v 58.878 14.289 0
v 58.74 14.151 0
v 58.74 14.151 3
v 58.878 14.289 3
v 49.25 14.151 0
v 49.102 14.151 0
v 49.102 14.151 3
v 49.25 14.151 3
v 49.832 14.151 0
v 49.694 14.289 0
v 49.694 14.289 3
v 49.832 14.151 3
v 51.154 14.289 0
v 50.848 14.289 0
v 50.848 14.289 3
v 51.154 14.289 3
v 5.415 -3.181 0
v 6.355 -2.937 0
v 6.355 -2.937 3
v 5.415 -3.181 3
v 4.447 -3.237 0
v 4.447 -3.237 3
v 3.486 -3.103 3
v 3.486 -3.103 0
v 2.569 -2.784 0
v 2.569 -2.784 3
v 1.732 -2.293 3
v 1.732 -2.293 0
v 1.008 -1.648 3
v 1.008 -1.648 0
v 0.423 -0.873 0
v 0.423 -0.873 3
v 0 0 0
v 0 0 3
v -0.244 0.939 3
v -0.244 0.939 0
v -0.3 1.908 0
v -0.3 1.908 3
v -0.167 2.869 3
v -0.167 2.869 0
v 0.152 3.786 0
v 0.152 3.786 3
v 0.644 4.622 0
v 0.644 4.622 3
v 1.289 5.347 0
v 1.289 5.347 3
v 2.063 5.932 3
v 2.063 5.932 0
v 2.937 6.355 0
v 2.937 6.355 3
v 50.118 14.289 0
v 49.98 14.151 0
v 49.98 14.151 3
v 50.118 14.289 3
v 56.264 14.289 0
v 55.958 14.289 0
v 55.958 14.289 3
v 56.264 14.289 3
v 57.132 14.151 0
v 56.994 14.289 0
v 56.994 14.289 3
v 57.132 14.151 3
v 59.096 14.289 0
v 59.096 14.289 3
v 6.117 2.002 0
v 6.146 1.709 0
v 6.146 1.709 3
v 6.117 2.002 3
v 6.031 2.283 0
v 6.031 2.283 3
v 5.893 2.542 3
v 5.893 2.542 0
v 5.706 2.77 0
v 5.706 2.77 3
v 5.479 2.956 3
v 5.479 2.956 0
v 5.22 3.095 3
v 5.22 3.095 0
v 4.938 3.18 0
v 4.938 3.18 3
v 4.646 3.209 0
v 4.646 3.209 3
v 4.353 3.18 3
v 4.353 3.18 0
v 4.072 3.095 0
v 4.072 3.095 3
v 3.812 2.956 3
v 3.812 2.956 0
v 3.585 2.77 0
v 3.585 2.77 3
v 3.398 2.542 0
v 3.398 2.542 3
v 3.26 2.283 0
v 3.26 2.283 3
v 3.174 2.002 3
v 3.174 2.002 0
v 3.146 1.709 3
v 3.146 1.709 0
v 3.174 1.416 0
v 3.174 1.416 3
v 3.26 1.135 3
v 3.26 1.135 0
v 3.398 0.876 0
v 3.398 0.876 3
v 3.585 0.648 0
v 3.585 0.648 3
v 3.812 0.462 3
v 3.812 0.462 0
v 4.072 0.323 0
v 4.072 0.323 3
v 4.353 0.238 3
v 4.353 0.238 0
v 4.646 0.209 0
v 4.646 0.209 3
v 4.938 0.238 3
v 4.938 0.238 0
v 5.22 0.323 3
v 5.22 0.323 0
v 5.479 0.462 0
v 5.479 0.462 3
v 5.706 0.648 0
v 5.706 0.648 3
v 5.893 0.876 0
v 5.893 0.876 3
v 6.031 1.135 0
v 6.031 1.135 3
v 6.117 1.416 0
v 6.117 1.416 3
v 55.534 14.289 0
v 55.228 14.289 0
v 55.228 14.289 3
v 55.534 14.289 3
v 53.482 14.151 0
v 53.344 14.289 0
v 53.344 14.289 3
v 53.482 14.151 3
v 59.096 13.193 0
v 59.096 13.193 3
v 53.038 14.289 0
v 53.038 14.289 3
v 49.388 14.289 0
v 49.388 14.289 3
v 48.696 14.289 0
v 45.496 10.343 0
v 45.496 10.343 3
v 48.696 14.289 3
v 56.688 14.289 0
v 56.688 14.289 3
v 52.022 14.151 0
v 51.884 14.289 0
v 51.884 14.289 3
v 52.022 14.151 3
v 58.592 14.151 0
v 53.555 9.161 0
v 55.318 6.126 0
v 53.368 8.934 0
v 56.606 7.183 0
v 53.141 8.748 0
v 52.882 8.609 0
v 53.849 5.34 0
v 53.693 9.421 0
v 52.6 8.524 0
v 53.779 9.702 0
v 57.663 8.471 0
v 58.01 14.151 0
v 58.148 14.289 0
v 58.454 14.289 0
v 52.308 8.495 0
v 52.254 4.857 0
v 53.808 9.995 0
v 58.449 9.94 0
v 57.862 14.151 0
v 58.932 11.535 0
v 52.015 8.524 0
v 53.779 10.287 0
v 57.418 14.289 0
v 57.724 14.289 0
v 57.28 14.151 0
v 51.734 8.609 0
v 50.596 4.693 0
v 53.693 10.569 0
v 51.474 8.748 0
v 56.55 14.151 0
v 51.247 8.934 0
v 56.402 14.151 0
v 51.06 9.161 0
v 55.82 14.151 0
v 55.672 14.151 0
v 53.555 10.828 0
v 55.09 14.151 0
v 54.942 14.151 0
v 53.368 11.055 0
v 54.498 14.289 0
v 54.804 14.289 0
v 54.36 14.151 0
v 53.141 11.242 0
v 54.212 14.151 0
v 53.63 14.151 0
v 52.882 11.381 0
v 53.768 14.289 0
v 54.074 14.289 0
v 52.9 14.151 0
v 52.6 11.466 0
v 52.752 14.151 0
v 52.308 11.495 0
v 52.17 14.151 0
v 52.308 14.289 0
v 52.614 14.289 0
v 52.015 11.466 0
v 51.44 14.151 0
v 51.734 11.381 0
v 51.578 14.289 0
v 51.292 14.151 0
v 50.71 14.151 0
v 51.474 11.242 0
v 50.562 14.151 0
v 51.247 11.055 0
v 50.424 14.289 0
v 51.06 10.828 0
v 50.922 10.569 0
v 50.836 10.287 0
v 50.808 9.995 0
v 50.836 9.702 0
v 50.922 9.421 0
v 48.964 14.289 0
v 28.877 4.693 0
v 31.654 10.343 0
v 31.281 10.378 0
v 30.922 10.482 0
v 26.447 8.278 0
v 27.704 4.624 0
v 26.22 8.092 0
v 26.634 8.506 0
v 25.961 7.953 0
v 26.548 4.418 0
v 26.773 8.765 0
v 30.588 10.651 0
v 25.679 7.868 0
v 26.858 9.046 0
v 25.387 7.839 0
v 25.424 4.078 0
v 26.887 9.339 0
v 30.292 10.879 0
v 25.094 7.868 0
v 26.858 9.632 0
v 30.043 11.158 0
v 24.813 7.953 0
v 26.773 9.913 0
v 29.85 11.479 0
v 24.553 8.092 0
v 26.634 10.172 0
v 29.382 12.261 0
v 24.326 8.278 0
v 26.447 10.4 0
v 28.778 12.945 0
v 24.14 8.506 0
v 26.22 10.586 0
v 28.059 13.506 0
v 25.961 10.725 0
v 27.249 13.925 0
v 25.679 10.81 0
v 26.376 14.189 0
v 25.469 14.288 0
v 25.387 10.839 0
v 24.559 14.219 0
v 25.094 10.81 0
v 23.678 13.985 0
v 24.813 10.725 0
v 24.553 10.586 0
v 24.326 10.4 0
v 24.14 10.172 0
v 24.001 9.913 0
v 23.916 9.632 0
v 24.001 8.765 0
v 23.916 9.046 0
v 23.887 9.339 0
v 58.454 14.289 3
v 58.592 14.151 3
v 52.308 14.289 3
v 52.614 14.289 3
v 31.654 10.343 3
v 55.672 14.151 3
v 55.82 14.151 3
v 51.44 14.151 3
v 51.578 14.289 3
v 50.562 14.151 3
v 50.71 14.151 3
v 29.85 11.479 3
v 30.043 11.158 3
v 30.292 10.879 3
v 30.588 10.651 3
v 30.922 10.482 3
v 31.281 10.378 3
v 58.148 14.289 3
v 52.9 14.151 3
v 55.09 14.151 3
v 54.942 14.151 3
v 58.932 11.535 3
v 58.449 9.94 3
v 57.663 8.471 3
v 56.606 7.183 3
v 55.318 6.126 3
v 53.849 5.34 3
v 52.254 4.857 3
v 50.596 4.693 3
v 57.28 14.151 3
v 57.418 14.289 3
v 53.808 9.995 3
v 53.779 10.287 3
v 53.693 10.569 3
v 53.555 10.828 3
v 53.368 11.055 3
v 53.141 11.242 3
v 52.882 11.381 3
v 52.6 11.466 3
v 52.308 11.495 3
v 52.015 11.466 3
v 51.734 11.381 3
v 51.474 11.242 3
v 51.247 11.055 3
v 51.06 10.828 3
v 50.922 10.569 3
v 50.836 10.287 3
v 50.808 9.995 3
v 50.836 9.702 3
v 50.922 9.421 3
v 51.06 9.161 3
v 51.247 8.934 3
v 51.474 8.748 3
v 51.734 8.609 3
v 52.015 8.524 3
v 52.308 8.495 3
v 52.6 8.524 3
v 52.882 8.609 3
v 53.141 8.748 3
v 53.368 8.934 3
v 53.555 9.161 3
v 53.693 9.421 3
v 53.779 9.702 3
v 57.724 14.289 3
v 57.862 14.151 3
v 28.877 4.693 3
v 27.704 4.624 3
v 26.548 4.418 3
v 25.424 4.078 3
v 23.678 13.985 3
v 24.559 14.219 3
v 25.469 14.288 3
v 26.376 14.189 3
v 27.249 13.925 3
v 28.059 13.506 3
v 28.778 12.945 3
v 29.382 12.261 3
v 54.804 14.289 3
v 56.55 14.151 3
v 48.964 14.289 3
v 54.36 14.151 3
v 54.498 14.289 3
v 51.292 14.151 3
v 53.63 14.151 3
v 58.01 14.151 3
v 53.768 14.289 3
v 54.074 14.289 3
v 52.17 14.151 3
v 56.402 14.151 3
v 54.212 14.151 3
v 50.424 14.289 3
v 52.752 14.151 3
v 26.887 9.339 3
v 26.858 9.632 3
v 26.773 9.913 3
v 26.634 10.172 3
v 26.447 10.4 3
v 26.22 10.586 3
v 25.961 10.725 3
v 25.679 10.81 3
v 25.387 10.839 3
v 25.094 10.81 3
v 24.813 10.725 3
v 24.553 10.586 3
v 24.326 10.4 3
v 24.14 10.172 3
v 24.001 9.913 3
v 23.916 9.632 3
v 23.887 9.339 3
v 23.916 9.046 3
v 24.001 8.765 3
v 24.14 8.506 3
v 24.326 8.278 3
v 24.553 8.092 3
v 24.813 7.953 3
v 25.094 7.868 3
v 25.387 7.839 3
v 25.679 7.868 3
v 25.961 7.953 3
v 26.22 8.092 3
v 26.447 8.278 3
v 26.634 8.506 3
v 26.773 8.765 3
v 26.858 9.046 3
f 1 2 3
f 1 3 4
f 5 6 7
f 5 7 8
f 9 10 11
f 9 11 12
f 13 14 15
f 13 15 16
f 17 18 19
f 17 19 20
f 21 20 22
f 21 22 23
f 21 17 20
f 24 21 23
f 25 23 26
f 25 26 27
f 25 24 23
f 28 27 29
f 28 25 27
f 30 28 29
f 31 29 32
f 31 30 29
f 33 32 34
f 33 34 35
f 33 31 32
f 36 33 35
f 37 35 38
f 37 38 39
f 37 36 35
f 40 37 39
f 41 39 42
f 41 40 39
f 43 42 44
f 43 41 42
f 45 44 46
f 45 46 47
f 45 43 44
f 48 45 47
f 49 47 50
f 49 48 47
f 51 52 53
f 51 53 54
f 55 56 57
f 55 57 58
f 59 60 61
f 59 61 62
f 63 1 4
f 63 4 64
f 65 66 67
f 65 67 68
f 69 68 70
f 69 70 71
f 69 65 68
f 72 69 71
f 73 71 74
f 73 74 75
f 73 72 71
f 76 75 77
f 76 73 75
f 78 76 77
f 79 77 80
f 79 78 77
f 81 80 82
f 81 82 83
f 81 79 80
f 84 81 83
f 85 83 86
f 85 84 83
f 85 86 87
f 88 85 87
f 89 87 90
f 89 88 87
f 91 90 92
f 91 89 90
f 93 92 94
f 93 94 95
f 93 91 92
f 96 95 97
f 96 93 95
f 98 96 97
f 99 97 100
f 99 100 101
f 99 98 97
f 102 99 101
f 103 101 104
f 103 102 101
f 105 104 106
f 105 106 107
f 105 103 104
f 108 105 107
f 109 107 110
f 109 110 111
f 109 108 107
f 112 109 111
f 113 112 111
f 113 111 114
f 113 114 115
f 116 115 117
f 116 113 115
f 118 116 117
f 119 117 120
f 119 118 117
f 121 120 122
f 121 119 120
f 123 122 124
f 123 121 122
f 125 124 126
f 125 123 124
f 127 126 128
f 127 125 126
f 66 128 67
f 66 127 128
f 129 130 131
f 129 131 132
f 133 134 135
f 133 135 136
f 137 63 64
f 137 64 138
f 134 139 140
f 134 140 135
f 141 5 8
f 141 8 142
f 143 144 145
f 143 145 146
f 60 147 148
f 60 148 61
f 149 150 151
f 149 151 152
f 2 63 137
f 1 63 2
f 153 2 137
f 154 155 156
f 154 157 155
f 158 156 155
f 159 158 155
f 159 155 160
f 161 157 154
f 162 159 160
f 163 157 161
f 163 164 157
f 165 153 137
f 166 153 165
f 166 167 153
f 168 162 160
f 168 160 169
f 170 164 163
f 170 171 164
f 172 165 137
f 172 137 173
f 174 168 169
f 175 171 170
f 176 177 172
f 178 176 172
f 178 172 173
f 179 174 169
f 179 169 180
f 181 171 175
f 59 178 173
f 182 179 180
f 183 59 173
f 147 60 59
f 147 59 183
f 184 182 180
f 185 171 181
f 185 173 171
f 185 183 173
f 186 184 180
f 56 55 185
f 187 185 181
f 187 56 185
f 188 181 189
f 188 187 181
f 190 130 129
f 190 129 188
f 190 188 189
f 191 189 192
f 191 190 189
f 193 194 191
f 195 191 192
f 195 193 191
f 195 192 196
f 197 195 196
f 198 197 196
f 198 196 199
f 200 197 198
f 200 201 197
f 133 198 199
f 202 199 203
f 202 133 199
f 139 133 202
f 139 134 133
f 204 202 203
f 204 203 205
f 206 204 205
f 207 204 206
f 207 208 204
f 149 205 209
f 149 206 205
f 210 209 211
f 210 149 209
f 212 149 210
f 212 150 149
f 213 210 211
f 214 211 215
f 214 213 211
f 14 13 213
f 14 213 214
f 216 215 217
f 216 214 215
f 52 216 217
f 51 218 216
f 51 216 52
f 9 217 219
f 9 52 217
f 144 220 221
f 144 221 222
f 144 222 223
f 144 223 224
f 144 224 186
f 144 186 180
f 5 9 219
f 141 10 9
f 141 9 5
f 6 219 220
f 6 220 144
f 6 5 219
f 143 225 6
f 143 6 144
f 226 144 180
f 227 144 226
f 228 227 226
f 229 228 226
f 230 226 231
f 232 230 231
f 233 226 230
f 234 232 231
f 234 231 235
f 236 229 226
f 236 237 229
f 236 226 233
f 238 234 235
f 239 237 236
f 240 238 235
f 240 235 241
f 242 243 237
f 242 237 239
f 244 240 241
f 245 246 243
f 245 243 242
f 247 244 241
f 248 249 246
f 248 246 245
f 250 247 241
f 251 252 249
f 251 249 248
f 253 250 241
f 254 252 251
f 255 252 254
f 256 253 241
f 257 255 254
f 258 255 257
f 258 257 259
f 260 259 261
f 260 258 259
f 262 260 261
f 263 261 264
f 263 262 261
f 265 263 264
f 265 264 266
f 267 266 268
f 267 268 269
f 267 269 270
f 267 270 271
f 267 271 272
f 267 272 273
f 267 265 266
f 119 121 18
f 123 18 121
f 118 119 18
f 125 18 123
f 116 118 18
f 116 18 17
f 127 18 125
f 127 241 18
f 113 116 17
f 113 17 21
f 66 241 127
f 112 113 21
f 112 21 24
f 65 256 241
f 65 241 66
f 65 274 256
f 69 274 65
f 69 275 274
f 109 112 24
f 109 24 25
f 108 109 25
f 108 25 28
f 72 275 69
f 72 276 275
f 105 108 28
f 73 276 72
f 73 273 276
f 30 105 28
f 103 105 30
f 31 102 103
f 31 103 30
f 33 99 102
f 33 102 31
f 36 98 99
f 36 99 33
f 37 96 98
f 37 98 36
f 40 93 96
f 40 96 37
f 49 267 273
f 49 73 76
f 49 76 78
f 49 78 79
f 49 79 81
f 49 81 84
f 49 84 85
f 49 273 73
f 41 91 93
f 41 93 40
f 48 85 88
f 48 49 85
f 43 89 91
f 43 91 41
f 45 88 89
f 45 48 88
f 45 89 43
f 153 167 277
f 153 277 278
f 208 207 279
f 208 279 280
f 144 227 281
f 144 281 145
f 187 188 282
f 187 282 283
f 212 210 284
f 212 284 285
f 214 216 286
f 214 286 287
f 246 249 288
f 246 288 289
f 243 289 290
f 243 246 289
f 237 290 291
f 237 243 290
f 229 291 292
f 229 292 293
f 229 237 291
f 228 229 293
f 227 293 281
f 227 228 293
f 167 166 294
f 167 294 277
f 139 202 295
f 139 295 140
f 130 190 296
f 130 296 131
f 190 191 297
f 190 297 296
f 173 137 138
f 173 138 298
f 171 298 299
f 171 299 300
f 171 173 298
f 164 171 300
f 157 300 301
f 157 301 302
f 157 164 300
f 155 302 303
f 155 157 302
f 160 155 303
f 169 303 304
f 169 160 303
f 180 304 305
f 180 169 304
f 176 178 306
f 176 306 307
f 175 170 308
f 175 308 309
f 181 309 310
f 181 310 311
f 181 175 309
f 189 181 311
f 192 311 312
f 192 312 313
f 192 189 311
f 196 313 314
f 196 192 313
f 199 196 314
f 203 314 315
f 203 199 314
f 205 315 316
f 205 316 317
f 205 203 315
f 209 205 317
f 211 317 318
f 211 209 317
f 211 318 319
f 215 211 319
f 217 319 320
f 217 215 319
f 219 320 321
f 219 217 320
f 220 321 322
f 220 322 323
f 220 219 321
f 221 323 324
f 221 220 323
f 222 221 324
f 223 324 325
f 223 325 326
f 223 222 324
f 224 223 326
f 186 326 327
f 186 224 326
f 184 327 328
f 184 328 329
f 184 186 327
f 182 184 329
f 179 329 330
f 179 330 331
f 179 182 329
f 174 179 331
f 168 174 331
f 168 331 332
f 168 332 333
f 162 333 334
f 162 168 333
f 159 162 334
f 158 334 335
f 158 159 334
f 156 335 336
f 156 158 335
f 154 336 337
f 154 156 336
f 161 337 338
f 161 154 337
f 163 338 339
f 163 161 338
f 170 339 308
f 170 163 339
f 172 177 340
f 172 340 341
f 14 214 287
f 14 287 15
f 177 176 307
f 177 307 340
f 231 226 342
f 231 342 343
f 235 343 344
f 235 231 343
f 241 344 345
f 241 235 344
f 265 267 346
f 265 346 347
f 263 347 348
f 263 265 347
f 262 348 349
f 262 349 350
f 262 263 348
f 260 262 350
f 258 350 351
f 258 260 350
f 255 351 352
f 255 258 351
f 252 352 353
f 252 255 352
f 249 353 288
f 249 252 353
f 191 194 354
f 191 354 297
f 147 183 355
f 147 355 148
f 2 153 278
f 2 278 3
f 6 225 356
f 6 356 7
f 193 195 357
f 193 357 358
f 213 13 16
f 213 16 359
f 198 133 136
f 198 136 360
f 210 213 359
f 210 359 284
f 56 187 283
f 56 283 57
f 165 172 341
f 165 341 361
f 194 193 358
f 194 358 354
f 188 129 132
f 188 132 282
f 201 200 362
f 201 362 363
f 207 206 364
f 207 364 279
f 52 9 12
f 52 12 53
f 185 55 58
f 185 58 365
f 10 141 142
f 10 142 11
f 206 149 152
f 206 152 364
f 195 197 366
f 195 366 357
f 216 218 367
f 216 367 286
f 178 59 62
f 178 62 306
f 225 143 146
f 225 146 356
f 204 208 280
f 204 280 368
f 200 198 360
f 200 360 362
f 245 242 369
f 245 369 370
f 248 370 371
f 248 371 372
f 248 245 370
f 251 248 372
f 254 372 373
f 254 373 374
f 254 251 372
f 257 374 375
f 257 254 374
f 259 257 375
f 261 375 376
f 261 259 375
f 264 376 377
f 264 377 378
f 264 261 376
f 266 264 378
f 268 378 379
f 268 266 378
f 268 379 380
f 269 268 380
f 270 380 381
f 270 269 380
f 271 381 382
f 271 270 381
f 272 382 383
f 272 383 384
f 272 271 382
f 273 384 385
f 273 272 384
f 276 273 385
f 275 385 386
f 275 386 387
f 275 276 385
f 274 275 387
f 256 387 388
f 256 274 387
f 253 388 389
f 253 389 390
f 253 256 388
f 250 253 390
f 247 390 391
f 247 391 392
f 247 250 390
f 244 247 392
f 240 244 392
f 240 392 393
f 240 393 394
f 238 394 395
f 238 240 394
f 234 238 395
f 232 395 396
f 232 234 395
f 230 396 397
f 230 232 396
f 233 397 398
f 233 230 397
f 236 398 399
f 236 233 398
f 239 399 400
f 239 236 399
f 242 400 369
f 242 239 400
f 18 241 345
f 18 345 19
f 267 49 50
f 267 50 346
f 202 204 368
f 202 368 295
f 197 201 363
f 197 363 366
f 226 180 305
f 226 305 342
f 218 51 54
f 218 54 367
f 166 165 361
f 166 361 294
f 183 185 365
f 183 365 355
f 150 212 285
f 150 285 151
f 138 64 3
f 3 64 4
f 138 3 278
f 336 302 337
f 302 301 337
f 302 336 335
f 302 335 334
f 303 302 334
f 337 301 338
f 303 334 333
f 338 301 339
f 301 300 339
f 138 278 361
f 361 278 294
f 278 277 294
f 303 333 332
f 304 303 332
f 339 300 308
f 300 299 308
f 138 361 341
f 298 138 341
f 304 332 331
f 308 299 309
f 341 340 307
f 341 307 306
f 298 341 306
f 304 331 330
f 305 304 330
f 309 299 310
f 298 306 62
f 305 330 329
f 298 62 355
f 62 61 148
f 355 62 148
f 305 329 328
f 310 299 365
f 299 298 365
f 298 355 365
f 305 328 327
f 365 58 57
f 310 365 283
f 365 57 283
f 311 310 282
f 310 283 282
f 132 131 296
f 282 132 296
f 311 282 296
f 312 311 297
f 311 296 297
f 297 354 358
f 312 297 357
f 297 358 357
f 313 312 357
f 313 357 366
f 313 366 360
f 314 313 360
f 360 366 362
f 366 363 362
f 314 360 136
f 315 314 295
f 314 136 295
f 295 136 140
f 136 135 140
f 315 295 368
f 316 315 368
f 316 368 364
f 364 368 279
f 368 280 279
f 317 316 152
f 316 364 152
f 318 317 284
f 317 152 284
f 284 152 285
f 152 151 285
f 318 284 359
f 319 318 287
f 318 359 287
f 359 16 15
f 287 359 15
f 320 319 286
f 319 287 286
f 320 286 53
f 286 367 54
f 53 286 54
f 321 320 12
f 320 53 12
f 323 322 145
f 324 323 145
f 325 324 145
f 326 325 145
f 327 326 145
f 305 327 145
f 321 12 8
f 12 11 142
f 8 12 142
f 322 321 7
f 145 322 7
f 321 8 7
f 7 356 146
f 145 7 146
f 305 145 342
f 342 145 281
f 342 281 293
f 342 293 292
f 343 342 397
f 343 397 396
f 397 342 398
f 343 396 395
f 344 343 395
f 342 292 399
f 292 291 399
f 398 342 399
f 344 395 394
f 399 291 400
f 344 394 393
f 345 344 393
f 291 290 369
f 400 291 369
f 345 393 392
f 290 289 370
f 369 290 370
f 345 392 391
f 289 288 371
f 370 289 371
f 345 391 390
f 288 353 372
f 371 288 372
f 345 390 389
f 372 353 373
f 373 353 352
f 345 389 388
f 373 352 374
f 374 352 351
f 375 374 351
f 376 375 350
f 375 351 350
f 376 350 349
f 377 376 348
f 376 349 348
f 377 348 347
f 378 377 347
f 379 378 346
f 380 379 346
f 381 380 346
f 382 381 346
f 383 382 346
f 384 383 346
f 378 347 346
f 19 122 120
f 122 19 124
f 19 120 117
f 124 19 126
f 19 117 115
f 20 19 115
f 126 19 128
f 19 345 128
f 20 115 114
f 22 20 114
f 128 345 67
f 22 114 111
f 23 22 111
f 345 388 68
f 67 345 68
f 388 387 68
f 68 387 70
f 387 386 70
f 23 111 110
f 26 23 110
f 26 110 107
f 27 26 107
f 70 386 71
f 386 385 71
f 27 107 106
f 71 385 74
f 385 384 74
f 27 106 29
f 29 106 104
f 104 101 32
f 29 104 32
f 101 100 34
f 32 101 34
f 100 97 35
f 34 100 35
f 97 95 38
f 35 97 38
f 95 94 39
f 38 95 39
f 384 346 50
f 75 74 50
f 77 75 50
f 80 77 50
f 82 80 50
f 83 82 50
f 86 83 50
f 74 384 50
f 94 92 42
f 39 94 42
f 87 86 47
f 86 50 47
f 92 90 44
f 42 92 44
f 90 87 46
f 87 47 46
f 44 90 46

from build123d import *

# Parameters (mm, degrees)
SKETCH2_R           = 1.5
BOSS_EXTRUDE1_DEPTH = 3


with BuildPart() as part:
    # Sketch2 → Boss-Extrude1 (new body)
    with BuildSketch(Plane.XY):
        with BuildLine():
            Line((2.936670729, 6.354601878), (23.677794427, 13.984528989))
            ThreePointArc((23.677794427, 13.984528989), (27.248698254, 13.925360384), (29.850364144, 11.47869129))
            ThreePointArc((29.850364144, 11.47869129), (30.588272685, 10.65075377), (31.653840565, 10.343256382))
            Line((31.653840565, 10.343256382), (45.495725577, 10.343256382))
            Line((45.495725577, 10.343256382), (48.695725577, 14.288892686))
            Line((48.695725577, 14.288892686), (48.964283059, 14.288892686))
            Line((48.964283059, 14.288892686), (49.101750655, 14.15142509))
            Line((49.101750655, 14.15142509), (49.250184878, 14.15142509))
            Line((49.250184878, 14.15142509), (49.387652474, 14.288892686))
            Line((49.387652474, 14.288892686), (49.694283059, 14.288892686))
            Line((49.694283059, 14.288892686), (49.831750655, 14.15142509))
            Line((49.831750655, 14.15142509), (49.980184878, 14.15142509))
            Line((49.980184878, 14.15142509), (50.117652474, 14.288892686))
            Line((50.117652474, 14.288892686), (50.424283059, 14.288892686))
            Line((50.424283059, 14.288892686), (50.561750655, 14.15142509))
            Line((50.561750655, 14.15142509), (50.710184878, 14.15142509))
            Line((50.710184878, 14.15142509), (50.847652474, 14.288892686))
            Line((50.847652474, 14.288892686), (51.154283059, 14.288892686))
            Line((51.154283059, 14.288892686), (51.291750655, 14.15142509))
            Line((51.291750655, 14.15142509), (51.440184878, 14.15142509))
            Line((51.440184878, 14.15142509), (51.577652474, 14.288892686))
            Line((51.577652474, 14.288892686), (51.884283059, 14.288892686))
            Line((51.884283059, 14.288892686), (52.021750655, 14.15142509))
            Line((52.021750655, 14.15142509), (52.170184878, 14.15142509))
            Line((52.170184878, 14.15142509), (52.307652474, 14.288892686))
            Line((52.307652474, 14.288892686), (52.614283059, 14.288892686))
            Line((52.614283059, 14.288892686), (52.751750655, 14.15142509))
            Line((52.751750655, 14.15142509), (52.900184878, 14.15142509))
            Line((52.900184878, 14.15142509), (53.037652474, 14.288892686))
            Line((53.037652474, 14.288892686), (53.344283059, 14.288892686))
            Line((53.344283059, 14.288892686), (53.481750655, 14.15142509))
            Line((53.481750655, 14.15142509), (53.630184878, 14.15142509))
            Line((53.630184878, 14.15142509), (53.767652474, 14.288892686))
            Line((53.767652474, 14.288892686), (54.074283059, 14.288892686))
            Line((54.074283059, 14.288892686), (54.211750655, 14.15142509))
            Line((54.211750655, 14.15142509), (54.360184878, 14.15142509))
            Line((54.360184878, 14.15142509), (54.497652474, 14.288892686))
            Line((54.497652474, 14.288892686), (54.804283059, 14.288892686))
            Line((54.804283059, 14.288892686), (54.941750655, 14.15142509))
            Line((54.941750655, 14.15142509), (55.090184878, 14.15142509))
            Line((55.090184878, 14.15142509), (55.227652474, 14.288892686))
            Line((55.227652474, 14.288892686), (55.534283059, 14.288892686))
            Line((55.534283059, 14.288892686), (55.671750655, 14.15142509))
            Line((55.671750655, 14.15142509), (55.820184878, 14.15142509))
            Line((55.820184878, 14.15142509), (55.957652474, 14.288892686))
            Line((55.957652474, 14.288892686), (56.264283059, 14.288892686))
            Line((56.264283059, 14.288892686), (56.401750655, 14.15142509))
            Line((56.401750655, 14.15142509), (56.550184878, 14.15142509))
            Line((56.550184878, 14.15142509), (56.687652474, 14.288892686))
            Line((56.687652474, 14.288892686), (56.994283059, 14.288892686))
            Line((56.994283059, 14.288892686), (57.131750655, 14.15142509))
            Line((57.131750655, 14.15142509), (57.280184878, 14.15142509))
            Line((57.280184878, 14.15142509), (57.417652474, 14.288892686))
            Line((57.417652474, 14.288892686), (57.724283059, 14.288892686))
            Line((57.724283059, 14.288892686), (57.861750655, 14.15142509))
            Line((57.861750655, 14.15142509), (58.010184878, 14.15142509))
            Line((58.010184878, 14.15142509), (58.147652474, 14.288892686))
            Line((58.147652474, 14.288892686), (58.454283059, 14.288892686))
            Line((58.454283059, 14.288892686), (58.591750655, 14.15142509))
            Line((58.591750655, 14.15142509), (58.740184878, 14.15142509))
            Line((58.740184878, 14.15142509), (58.877652474, 14.288892686))
            Line((58.877652474, 14.288892686), (59.095725577, 14.288892686))
            Line((59.095725577, 14.288892686), (59.095725577, 13.193256382))
            ThreePointArc((59.095725577, 13.193256382), (56.606133217, 7.182848742), (50.595725577, 4.693256382))
            Line((50.595725577, 4.693256382), (28.876707599, 4.693256382))
            ThreePointArc((28.876707599, 4.693256382), (27.123316378, 4.538337348), (25.424251892, 4.078380228))
            Line((25.424251892, 4.078380228), (6.354601878, -2.936670729))
            ThreePointArc((6.354601878, -2.936670729), (0, 0), (2.936670729, 6.354601878))
        make_face()
        with Locations((4.645636304, 1.708965575)):
            Circle(SKETCH2_R, mode=Mode.SUBTRACT)
        with Locations((25.386760002, 9.338892686)):
            Circle(SKETCH2_R, mode=Mode.SUBTRACT)
        with Locations((52.307652474, 9.994763619)):
            Circle(SKETCH2_R, mode=Mode.SUBTRACT)
    extrude(amount=BOSS_EXTRUDE1_DEPTH)


solid = part.part
